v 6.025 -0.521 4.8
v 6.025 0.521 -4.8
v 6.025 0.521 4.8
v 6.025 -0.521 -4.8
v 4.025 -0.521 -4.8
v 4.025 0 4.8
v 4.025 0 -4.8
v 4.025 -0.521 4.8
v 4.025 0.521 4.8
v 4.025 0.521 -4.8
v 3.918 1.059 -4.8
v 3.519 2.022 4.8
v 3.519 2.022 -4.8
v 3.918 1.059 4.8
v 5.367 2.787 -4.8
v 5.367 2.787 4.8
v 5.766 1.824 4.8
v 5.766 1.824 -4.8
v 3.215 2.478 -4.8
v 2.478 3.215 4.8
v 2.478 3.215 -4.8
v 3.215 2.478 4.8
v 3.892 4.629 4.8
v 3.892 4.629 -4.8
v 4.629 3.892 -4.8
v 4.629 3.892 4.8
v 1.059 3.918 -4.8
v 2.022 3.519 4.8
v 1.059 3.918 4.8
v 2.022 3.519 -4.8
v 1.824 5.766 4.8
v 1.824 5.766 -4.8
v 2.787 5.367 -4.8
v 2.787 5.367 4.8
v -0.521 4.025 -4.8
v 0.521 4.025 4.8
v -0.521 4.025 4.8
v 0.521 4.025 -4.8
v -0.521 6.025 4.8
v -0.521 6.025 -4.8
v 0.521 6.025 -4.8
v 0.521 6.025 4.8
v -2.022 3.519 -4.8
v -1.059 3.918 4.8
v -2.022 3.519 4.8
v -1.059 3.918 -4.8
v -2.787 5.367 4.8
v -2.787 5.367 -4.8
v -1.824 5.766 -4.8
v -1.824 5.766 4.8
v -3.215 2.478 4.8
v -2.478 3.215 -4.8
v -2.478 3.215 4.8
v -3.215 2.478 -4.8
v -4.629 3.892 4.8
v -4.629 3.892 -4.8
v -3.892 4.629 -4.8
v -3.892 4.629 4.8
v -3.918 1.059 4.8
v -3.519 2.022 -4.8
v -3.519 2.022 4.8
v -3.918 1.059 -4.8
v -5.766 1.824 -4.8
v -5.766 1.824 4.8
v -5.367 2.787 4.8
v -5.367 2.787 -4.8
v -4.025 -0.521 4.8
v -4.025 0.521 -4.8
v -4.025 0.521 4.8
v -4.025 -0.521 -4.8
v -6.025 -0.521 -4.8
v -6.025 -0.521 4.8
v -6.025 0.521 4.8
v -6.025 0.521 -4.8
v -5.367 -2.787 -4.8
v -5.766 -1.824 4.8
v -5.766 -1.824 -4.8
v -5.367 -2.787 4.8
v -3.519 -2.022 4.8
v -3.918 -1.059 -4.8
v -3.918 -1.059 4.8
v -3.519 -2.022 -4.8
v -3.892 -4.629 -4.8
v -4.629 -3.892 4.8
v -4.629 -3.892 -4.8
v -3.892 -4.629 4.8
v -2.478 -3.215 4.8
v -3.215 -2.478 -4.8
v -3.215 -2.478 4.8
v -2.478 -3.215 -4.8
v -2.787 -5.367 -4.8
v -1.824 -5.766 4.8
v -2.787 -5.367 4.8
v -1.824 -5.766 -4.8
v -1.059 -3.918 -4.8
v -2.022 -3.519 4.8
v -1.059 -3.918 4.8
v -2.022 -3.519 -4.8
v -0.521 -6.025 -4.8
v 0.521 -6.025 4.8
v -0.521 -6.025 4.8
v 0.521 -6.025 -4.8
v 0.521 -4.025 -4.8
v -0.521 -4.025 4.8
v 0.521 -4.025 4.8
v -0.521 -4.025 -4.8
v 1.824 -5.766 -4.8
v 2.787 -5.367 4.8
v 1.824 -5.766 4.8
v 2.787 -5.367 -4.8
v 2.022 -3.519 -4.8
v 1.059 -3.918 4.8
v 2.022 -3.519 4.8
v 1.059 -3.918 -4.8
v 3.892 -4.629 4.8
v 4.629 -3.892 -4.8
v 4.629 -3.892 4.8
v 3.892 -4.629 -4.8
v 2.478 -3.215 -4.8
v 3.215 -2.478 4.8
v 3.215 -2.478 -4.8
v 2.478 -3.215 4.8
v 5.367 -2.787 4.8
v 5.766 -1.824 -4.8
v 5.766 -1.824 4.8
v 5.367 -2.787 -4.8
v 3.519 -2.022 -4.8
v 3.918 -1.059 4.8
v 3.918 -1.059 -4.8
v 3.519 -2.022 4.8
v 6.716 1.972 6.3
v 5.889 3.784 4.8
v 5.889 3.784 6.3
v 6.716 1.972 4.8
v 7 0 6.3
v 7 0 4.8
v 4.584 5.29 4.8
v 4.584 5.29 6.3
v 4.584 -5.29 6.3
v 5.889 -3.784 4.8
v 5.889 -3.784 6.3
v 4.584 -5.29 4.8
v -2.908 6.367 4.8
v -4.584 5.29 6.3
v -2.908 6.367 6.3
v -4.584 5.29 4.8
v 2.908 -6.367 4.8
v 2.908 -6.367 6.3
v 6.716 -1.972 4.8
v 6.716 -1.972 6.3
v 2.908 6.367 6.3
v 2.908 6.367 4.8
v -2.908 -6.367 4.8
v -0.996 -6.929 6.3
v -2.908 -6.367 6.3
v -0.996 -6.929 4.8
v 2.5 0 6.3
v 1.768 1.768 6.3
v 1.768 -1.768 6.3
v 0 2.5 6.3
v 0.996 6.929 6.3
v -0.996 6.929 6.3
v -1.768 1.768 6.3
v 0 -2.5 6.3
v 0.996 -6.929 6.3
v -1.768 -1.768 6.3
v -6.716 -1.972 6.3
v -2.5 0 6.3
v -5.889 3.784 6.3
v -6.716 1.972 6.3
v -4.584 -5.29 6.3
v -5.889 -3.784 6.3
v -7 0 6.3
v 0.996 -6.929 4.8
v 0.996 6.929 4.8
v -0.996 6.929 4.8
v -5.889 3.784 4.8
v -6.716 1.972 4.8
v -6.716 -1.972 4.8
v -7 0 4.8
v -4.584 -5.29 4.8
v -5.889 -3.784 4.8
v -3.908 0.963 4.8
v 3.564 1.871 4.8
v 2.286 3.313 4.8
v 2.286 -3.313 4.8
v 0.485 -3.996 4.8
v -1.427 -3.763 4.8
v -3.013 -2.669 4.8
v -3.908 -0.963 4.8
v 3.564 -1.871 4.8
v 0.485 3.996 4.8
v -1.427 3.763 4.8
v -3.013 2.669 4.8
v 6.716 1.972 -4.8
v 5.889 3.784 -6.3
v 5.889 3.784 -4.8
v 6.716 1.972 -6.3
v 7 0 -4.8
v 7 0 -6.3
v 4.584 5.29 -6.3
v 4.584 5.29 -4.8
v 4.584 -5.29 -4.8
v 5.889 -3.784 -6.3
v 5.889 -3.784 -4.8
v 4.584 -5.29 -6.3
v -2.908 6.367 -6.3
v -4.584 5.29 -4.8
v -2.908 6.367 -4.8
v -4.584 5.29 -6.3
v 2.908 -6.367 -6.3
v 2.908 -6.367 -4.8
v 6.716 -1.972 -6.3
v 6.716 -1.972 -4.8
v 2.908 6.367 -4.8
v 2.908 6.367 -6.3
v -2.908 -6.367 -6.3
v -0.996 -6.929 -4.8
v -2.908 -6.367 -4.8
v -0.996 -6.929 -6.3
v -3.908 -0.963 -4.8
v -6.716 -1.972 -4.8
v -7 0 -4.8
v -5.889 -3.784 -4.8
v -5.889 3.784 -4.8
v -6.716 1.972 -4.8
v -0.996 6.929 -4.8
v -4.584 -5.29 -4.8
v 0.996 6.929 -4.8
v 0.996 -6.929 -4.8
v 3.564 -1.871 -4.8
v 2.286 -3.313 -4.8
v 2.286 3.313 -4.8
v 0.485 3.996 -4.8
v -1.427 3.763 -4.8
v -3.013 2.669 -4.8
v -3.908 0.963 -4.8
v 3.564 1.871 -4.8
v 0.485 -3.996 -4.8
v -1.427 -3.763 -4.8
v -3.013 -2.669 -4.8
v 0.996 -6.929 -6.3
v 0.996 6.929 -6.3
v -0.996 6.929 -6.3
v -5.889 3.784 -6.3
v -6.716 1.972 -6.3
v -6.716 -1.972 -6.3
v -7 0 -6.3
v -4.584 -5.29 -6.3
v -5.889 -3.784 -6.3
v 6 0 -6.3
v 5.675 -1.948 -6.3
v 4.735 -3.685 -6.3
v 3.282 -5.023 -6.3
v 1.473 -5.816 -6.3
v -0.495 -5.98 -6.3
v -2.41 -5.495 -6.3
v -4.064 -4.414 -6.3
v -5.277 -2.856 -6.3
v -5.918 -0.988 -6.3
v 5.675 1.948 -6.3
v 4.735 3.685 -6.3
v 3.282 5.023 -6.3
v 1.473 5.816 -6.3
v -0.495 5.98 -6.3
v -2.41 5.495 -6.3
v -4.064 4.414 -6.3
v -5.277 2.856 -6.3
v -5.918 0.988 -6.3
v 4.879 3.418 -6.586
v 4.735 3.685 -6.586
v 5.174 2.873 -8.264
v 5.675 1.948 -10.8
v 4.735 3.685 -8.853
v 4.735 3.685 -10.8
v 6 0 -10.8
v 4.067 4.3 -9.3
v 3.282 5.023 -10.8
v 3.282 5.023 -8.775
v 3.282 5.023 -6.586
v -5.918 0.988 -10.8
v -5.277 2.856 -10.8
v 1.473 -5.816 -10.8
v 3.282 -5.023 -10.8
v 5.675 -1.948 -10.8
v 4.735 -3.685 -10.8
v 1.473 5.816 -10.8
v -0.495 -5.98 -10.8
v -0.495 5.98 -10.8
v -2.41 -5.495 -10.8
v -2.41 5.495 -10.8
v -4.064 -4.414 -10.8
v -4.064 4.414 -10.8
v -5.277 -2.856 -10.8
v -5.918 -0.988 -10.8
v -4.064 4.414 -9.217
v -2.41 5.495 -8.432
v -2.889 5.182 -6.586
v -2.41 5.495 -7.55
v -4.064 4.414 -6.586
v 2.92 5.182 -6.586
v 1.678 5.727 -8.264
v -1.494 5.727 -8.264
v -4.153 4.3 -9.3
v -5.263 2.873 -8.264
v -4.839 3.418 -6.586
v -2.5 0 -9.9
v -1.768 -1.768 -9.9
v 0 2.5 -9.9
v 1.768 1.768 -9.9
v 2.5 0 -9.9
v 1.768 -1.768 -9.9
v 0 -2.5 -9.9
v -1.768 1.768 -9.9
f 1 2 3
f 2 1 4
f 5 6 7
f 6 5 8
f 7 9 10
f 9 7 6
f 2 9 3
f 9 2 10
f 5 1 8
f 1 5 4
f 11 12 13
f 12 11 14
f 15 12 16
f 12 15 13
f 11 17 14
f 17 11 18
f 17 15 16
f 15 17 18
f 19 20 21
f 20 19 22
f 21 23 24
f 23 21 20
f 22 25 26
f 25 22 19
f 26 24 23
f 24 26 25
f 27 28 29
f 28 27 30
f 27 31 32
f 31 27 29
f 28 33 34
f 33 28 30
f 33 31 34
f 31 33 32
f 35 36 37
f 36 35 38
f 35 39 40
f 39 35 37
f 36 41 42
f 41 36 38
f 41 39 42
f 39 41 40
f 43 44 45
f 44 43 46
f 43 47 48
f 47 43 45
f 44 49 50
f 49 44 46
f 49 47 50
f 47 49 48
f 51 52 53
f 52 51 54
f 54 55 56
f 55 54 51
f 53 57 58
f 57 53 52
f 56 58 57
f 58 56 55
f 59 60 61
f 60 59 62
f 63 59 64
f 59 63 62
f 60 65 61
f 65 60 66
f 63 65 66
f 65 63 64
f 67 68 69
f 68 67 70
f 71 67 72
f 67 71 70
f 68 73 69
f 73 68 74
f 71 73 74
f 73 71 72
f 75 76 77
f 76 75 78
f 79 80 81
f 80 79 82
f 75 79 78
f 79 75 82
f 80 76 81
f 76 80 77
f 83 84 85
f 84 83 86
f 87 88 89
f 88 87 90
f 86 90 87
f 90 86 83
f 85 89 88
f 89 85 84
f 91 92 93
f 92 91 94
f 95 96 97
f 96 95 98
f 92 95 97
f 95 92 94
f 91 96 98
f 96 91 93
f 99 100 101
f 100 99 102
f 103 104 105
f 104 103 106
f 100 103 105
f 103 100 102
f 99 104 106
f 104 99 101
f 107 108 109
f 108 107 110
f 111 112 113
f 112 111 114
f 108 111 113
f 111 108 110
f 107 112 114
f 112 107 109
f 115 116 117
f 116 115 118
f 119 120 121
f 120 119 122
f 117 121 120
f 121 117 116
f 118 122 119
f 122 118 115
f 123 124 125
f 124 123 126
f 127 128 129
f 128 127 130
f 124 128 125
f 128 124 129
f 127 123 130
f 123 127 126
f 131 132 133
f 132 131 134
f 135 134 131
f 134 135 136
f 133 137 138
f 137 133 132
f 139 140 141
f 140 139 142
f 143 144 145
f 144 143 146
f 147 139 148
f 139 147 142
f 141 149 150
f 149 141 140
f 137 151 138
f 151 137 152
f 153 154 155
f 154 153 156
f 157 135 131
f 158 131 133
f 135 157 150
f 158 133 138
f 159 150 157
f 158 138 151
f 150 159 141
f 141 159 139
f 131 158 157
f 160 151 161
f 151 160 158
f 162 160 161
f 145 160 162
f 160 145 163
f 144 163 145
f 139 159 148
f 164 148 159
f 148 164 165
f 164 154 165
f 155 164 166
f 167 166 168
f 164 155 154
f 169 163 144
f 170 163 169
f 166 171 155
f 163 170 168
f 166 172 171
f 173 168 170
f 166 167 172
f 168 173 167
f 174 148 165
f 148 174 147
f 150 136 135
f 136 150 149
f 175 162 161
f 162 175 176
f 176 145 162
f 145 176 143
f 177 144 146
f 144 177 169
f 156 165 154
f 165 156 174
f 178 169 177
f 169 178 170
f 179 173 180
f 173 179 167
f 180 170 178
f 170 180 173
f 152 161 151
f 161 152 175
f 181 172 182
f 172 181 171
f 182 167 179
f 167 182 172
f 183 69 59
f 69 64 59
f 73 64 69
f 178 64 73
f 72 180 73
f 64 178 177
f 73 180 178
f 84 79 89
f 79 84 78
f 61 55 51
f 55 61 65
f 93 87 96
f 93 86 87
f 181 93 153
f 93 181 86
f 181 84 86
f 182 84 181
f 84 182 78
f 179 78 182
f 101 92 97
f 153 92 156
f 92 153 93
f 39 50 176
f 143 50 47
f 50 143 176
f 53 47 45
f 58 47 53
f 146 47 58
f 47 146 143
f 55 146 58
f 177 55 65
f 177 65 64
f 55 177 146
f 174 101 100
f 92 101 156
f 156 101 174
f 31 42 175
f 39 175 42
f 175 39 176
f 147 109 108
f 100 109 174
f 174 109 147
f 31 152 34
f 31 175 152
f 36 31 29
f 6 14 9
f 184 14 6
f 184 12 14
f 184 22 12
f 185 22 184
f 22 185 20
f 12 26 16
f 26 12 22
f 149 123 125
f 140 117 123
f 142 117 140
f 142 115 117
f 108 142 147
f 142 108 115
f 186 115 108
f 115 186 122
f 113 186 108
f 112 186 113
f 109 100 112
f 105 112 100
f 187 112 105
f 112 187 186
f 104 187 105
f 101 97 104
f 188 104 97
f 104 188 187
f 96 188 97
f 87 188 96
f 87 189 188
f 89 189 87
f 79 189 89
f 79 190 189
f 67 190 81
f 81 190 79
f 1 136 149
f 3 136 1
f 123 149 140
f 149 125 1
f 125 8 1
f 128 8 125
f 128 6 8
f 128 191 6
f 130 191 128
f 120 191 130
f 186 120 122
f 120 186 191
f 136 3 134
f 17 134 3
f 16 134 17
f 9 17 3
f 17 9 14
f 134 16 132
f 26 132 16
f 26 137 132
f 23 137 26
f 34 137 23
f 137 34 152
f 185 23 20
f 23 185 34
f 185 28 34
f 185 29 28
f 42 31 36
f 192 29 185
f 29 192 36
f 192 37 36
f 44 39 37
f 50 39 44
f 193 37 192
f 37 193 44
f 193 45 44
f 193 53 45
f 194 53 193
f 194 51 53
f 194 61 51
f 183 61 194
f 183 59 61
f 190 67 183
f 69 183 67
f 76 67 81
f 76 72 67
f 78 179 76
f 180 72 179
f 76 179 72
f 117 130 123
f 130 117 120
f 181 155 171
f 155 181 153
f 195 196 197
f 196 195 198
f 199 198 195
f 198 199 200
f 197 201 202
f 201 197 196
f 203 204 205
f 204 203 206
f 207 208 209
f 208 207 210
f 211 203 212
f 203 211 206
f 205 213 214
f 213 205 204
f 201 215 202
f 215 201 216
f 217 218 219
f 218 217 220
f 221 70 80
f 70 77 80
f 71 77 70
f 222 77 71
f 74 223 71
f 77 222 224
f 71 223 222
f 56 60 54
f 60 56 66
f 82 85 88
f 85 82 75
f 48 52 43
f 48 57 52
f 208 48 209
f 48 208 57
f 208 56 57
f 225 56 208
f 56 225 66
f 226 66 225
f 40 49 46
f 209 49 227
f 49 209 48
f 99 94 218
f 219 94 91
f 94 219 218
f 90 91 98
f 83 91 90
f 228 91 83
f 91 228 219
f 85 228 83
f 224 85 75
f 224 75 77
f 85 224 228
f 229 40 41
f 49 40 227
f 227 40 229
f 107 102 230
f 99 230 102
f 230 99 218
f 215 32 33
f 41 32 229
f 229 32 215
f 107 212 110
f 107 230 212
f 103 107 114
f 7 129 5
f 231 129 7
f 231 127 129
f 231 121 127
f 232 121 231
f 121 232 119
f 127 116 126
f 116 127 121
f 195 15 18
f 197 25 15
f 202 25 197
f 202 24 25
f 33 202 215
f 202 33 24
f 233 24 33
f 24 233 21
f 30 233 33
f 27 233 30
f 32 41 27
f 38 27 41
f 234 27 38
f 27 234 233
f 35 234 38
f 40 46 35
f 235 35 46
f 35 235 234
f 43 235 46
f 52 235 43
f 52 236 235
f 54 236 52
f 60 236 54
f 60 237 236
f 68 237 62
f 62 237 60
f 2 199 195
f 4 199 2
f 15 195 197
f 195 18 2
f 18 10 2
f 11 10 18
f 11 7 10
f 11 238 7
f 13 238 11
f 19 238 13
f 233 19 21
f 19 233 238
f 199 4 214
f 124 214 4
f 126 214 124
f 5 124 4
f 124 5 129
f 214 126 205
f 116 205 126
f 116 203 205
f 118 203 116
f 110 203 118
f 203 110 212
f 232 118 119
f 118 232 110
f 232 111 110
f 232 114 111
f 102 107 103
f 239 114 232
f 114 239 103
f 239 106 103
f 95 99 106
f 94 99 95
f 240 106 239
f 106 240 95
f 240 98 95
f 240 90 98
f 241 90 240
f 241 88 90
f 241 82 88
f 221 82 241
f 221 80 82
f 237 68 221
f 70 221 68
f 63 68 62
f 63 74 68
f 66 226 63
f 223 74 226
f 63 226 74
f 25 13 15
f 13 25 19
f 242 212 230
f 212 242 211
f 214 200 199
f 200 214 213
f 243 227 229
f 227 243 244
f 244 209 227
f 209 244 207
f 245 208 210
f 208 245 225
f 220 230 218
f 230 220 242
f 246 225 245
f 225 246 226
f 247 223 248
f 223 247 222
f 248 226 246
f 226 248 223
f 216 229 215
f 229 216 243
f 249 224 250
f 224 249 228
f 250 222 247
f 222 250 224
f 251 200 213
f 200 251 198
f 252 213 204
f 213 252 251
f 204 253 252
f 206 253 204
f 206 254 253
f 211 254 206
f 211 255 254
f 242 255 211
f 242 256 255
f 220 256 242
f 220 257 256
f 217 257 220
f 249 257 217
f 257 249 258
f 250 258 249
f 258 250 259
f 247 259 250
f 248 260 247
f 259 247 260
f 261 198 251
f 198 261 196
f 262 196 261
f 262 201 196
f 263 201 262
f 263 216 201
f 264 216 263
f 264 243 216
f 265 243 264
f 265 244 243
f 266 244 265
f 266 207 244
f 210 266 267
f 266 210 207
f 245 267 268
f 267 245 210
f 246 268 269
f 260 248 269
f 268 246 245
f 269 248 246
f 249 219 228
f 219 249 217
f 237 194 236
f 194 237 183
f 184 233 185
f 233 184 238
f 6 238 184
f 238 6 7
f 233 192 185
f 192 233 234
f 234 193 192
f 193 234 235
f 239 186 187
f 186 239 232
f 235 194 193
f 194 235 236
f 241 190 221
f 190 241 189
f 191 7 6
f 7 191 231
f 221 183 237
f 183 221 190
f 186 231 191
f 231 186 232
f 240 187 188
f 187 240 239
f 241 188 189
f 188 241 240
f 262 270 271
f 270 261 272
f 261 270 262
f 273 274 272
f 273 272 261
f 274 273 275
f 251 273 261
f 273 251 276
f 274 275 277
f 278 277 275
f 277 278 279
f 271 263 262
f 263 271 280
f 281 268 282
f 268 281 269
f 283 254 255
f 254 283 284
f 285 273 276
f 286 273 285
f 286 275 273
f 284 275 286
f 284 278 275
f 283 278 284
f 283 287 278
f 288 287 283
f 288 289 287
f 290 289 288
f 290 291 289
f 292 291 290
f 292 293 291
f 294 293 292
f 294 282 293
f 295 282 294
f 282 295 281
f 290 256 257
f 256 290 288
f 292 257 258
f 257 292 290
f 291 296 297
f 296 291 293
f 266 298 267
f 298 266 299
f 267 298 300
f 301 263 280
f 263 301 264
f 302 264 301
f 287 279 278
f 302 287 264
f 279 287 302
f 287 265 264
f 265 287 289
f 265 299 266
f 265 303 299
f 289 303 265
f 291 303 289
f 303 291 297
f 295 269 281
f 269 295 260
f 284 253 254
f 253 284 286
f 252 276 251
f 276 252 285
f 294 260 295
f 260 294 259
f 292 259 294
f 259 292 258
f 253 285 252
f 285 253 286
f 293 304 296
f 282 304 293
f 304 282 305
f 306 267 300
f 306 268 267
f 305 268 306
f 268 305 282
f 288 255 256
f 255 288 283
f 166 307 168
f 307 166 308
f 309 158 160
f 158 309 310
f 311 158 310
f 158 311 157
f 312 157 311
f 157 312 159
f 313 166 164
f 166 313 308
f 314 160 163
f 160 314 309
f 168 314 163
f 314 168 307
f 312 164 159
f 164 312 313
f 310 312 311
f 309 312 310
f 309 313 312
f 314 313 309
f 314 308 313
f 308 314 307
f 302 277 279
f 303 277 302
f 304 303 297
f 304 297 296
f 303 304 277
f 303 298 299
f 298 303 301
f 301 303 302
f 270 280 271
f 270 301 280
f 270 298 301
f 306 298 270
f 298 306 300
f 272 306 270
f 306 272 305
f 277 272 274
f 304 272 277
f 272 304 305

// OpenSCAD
// Parameters
tooth_count = 16; //[8:64:1]
pitch_diameter_mm = 9.65; //[4.825:19.3:0.01]
pitch_radius_mm = 4.825; //[2.4125:9.65:0.01]
pulley_width_mm = 10; //[5:30:1]
bore_diameter_mm = 5; //[2:10:0.1]
hub_diameter_mm = 12; //[6:24:0.1]
hub_length_mm = 6; //[0:20:0.5]
flange_diameter_mm = 14; //[8:30:0.1]
flange_thickness_mm = 1.5; //[0:5:0.1]
set_screw_count = 1; //[0:2:1]
set_screw_size = 3; //[2:6:0.5]
set_screw_z_offset_mm = 0; //[-10:10:0.5]
tooth_radial_height_mm = 1.2; //[0.6:2.4:0.1]
tooth_tangential_width_factor = 0.55; //[0.3:0.9:0.01]
tooth_overlap_mm = 0.8; //[0.5:2:0.1]
body_wall_to_pitch_mm = 0.8; //[0.3:2:0.1]
eps_mm = 0.2; //[0.05:0.5:0.05]

// Pulley Body
module pulley_body() {
  color("Silver") {
    cylinder(r=pitch_radius_mm - body_wall_to_pitch_mm, h=pulley_width_mm, center=true);
  }
}

// Tooth Prototype
module tooth_proto() {
  translate([pitch_radius_mm + (tooth_radial_height_mm + tooth_overlap_mm)/2 - tooth_overlap_mm, 0, 0])
  cube([tooth_radial_height_mm + tooth_overlap_mm, 
        (PI * pitch_diameter_mm / tooth_count) * tooth_tangential_width_factor, 
        pulley_width_mm], center=true);
}

// Printed Pulley Teeth
module printed_pulley_teeth() {
  for (i = [0:tooth_count-1]) {
    rotate([0, 0, i * 360 / tooth_count]) tooth_proto();
  }
}

// Hub
module hub() {
  if (hub_length_mm > 0) {
    color("Silver") {
      translate([0, 0, -pulley_width_mm/2 - hub_length_mm/2 + eps_mm])
      cylinder(r=hub_diameter_mm/2, h=hub_length_mm, center=true);
    }
  }
}

// Flanges
module flanges() {
  if (flange_thickness_mm > 0) {
    color("Silver") {
      translate([0, 0, pulley_width_mm/2 + flange_thickness_mm/2 - eps_mm])
      cylinder(r=flange_diameter_mm/2, h=flange_thickness_mm, center=true);
      translate([0, 0, -pulley_width_mm/2 - flange_thickness_mm/2 + eps_mm])
      cylinder(r=flange_diameter_mm/2, h=flange_thickness_mm, center=true);
    }
  }
}

// Center Bore
module center_bore() {
  cylinder(r=bore_diameter_mm/2, 
           h=pulley_width_mm + hub_length_mm + 2*flange_thickness_mm + 4*eps_mm, 
           center=true);
}

// Set Screw Holes
module set_screw_holes() {
  if (set_screw_count > 0) {
    translate([0, hub_diameter_mm/2 - set_screw_size/2 - eps_mm, 
               -pulley_width_mm/2 - hub_length_mm/2 + eps_mm + set_screw_z_offset_mm])
    rotate([0, 90, 0])
    cylinder(r=set_screw_size/2, h=hub_diameter_mm + 2*eps_mm, center=true);
    
    if (set_screw_count > 1) {
      rotate([0, 0, 90])
      translate([0, hub_diameter_mm/2 - set_screw_size/2 - eps_mm, 
                 -pulley_width_mm/2 - hub_length_mm/2 + eps_mm + set_screw_z_offset_mm])
      rotate([0, 90, 0])
      cylinder(r=set_screw_size/2, h=hub_diameter_mm + 2*eps_mm, center=true);
    }
  }
}

// Pulley Assembly
module pulley() {
  difference() {
    union() {
      pulley_body();
      printed_pulley_teeth();
      hub();
      flanges();
    }
    center_bore();
    set_screw_holes();
  }
}

// Final Assembly
module assembly() {
  pulley();
}

assembly();
